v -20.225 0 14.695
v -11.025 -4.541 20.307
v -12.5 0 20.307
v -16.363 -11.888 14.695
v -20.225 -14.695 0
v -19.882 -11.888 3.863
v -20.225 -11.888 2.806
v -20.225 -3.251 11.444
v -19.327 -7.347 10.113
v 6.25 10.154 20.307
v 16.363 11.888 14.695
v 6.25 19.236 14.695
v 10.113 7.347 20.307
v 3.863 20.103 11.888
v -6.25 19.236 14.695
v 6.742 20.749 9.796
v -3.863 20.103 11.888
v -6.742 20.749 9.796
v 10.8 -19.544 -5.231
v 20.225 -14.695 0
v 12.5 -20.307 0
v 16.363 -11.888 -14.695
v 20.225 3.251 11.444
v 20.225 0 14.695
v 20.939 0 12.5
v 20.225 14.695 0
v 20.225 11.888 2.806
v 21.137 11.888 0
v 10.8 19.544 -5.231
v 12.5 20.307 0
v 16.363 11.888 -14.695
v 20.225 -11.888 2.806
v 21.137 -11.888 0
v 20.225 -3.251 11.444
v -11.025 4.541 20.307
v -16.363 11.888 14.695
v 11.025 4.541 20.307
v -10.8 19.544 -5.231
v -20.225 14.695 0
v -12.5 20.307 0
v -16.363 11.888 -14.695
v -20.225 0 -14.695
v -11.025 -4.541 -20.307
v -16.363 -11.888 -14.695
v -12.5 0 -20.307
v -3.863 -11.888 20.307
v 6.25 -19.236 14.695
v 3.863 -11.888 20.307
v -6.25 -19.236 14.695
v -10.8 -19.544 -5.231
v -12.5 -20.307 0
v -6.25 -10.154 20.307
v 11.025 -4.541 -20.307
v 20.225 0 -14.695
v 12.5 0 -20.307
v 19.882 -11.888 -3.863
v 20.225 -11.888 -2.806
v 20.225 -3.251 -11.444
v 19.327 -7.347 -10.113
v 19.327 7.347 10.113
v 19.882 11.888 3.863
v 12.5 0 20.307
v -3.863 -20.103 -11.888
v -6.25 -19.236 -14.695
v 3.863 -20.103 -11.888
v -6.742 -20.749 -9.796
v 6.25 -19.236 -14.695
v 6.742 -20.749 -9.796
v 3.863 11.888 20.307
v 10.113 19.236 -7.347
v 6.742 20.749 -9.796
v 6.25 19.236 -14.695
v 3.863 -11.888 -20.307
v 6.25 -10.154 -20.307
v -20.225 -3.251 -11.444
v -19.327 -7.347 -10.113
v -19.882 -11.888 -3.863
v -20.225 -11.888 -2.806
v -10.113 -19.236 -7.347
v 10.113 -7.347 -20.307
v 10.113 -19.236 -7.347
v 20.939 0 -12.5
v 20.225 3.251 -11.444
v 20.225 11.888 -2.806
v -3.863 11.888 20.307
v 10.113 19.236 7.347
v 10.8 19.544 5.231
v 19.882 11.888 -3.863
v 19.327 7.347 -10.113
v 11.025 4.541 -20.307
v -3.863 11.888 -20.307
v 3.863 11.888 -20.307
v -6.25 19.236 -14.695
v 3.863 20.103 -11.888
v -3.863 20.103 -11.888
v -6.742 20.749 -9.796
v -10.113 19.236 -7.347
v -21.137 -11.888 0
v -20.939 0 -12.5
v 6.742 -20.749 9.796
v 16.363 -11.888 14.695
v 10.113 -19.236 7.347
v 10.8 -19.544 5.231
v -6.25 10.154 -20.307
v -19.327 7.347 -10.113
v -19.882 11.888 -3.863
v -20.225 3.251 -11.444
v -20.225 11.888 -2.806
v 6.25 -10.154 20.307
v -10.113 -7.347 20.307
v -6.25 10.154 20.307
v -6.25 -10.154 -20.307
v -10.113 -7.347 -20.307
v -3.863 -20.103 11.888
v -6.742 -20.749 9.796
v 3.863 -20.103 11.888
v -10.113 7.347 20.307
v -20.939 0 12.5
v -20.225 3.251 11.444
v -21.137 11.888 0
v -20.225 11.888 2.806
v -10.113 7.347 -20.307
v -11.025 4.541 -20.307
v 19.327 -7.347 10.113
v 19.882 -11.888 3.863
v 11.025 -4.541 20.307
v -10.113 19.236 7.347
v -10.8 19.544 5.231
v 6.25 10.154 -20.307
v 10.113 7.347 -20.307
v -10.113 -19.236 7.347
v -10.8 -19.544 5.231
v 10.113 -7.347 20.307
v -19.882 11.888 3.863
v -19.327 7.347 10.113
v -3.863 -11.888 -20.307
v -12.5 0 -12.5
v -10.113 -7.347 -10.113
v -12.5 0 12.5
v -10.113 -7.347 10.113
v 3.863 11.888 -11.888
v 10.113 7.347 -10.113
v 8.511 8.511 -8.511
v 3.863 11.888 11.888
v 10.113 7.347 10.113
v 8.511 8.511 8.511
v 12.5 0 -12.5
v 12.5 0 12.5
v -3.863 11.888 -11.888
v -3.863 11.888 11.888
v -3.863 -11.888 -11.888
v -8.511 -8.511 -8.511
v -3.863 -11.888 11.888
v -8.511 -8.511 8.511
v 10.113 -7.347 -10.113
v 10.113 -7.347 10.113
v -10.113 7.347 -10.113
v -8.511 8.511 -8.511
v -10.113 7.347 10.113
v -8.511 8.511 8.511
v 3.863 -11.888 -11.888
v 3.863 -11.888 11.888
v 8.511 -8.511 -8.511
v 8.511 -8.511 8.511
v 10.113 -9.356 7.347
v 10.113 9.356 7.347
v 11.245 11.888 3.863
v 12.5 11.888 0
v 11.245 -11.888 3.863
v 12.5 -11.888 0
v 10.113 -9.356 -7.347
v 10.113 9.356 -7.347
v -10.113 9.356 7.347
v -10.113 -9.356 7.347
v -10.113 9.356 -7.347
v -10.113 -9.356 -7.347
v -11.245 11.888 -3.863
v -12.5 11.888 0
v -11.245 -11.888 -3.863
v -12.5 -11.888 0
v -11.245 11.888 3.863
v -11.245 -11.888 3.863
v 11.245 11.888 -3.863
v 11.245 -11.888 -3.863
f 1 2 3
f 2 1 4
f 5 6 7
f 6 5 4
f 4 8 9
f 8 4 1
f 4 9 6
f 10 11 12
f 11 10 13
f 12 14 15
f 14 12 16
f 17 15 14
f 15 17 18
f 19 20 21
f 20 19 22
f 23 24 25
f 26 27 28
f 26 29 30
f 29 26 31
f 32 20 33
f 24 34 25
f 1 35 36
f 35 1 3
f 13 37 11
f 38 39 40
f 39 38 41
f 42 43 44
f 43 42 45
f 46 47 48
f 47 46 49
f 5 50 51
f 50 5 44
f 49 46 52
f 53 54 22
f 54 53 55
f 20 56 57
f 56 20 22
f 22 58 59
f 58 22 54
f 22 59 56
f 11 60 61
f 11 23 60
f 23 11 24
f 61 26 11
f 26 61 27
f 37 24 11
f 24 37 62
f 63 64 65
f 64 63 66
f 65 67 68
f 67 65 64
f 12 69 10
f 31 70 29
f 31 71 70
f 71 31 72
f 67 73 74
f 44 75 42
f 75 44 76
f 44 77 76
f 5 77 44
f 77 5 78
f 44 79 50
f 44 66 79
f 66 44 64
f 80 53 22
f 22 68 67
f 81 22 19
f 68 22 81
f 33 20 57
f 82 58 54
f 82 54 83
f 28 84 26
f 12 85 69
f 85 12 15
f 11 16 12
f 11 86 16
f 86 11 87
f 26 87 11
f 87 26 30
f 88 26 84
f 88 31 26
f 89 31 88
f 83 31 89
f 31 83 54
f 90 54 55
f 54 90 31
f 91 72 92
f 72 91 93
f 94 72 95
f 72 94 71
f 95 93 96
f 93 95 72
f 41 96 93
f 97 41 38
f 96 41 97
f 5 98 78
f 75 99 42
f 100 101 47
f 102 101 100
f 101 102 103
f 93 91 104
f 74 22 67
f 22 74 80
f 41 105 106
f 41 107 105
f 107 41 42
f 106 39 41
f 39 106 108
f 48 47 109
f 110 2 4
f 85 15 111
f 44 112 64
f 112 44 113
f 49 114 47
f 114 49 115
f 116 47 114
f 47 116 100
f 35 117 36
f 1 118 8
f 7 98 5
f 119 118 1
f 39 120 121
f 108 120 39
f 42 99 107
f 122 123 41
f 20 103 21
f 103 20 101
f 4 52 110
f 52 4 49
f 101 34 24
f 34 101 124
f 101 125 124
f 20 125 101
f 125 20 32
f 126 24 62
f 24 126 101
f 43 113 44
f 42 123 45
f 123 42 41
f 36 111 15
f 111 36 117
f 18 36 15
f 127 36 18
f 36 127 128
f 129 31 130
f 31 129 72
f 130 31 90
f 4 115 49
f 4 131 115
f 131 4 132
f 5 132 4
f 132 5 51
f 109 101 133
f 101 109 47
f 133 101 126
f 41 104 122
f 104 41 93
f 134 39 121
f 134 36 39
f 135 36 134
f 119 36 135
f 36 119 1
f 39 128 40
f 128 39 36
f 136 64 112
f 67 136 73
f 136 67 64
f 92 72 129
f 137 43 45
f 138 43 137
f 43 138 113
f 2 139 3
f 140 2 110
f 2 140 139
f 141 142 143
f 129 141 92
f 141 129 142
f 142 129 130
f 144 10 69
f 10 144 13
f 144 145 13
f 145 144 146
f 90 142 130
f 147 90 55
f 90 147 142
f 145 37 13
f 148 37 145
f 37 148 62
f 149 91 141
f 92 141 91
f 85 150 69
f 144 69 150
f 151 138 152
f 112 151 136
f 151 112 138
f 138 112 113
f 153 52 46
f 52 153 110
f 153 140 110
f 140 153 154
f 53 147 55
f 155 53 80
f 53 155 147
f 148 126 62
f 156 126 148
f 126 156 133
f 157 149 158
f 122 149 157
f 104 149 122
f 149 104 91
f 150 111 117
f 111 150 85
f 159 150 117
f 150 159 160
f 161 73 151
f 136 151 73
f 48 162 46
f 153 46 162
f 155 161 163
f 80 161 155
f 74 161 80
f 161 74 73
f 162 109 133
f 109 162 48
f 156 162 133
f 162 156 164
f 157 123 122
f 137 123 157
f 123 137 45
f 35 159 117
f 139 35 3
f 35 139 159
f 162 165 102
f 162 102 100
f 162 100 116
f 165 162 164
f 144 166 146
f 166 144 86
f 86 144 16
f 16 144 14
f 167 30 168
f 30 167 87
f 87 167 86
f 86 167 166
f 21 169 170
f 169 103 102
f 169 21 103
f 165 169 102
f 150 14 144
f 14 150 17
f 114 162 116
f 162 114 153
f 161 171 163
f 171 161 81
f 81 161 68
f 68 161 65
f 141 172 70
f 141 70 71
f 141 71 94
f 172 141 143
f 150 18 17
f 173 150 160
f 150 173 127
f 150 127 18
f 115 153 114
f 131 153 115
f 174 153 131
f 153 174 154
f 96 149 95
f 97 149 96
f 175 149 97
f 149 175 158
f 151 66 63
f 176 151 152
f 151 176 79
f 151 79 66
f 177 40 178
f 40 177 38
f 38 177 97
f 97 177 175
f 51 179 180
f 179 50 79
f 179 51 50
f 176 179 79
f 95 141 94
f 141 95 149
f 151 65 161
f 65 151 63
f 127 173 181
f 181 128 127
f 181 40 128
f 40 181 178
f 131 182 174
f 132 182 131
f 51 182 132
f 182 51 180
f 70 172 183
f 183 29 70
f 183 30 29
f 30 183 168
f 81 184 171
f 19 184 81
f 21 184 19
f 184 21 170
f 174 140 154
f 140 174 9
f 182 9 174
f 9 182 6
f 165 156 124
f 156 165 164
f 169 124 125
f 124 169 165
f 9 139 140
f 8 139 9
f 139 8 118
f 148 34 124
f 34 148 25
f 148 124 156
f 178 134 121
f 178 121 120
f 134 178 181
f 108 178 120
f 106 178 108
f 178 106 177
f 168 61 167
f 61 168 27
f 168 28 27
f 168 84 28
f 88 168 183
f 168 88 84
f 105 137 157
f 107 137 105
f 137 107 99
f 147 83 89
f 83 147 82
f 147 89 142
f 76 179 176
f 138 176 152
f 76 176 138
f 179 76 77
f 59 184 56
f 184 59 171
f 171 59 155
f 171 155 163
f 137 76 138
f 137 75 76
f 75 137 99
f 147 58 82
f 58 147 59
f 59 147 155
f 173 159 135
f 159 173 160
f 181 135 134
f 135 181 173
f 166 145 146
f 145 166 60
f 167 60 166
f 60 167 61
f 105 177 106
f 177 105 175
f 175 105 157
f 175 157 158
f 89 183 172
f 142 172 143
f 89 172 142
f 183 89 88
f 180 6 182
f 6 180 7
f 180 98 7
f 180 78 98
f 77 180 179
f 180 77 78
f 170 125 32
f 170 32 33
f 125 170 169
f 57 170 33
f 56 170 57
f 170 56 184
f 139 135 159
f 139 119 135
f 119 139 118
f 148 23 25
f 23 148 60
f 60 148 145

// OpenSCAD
// part to generate
part = "ball"; // [all, ball, stick]

// size of the model
size = 50; // [10:5:100]

/* [Animation] */
// resolution
$fn = 10;

/* [Animation] */
// rotating animation
animation_rotation = false;

/* [Hidden] */
is_animated = animation_rotation;
$vpt = is_animated?[0, 0, 0]:$vpt;
$vpr = is_animated?[60, 0, animation_rotation?(365 * $t):45]:$vpr;  // animation rotate around the object
$vpd = is_animated?200:$vpd;

if (part == "ball") {
  ball(size);
} else if (part == "stick") {
  stick(size);
} else {
  ball(size);
  stick(size);
}

module stick(size) {
  color("green") rotate([0, 90, 0]) cylinder(d = size / 2, h = size * 1.25, center = true);
}

module ball(size) {
  difference() {
    sphere(d = size);
    cylinder(d = size / 2, h = size * 1.25, center = true);
    #rotate([90, 0, 0]) cylinder(d = size / 2, h = size * 1.25, center = true);
    stick(size);
  }
}
